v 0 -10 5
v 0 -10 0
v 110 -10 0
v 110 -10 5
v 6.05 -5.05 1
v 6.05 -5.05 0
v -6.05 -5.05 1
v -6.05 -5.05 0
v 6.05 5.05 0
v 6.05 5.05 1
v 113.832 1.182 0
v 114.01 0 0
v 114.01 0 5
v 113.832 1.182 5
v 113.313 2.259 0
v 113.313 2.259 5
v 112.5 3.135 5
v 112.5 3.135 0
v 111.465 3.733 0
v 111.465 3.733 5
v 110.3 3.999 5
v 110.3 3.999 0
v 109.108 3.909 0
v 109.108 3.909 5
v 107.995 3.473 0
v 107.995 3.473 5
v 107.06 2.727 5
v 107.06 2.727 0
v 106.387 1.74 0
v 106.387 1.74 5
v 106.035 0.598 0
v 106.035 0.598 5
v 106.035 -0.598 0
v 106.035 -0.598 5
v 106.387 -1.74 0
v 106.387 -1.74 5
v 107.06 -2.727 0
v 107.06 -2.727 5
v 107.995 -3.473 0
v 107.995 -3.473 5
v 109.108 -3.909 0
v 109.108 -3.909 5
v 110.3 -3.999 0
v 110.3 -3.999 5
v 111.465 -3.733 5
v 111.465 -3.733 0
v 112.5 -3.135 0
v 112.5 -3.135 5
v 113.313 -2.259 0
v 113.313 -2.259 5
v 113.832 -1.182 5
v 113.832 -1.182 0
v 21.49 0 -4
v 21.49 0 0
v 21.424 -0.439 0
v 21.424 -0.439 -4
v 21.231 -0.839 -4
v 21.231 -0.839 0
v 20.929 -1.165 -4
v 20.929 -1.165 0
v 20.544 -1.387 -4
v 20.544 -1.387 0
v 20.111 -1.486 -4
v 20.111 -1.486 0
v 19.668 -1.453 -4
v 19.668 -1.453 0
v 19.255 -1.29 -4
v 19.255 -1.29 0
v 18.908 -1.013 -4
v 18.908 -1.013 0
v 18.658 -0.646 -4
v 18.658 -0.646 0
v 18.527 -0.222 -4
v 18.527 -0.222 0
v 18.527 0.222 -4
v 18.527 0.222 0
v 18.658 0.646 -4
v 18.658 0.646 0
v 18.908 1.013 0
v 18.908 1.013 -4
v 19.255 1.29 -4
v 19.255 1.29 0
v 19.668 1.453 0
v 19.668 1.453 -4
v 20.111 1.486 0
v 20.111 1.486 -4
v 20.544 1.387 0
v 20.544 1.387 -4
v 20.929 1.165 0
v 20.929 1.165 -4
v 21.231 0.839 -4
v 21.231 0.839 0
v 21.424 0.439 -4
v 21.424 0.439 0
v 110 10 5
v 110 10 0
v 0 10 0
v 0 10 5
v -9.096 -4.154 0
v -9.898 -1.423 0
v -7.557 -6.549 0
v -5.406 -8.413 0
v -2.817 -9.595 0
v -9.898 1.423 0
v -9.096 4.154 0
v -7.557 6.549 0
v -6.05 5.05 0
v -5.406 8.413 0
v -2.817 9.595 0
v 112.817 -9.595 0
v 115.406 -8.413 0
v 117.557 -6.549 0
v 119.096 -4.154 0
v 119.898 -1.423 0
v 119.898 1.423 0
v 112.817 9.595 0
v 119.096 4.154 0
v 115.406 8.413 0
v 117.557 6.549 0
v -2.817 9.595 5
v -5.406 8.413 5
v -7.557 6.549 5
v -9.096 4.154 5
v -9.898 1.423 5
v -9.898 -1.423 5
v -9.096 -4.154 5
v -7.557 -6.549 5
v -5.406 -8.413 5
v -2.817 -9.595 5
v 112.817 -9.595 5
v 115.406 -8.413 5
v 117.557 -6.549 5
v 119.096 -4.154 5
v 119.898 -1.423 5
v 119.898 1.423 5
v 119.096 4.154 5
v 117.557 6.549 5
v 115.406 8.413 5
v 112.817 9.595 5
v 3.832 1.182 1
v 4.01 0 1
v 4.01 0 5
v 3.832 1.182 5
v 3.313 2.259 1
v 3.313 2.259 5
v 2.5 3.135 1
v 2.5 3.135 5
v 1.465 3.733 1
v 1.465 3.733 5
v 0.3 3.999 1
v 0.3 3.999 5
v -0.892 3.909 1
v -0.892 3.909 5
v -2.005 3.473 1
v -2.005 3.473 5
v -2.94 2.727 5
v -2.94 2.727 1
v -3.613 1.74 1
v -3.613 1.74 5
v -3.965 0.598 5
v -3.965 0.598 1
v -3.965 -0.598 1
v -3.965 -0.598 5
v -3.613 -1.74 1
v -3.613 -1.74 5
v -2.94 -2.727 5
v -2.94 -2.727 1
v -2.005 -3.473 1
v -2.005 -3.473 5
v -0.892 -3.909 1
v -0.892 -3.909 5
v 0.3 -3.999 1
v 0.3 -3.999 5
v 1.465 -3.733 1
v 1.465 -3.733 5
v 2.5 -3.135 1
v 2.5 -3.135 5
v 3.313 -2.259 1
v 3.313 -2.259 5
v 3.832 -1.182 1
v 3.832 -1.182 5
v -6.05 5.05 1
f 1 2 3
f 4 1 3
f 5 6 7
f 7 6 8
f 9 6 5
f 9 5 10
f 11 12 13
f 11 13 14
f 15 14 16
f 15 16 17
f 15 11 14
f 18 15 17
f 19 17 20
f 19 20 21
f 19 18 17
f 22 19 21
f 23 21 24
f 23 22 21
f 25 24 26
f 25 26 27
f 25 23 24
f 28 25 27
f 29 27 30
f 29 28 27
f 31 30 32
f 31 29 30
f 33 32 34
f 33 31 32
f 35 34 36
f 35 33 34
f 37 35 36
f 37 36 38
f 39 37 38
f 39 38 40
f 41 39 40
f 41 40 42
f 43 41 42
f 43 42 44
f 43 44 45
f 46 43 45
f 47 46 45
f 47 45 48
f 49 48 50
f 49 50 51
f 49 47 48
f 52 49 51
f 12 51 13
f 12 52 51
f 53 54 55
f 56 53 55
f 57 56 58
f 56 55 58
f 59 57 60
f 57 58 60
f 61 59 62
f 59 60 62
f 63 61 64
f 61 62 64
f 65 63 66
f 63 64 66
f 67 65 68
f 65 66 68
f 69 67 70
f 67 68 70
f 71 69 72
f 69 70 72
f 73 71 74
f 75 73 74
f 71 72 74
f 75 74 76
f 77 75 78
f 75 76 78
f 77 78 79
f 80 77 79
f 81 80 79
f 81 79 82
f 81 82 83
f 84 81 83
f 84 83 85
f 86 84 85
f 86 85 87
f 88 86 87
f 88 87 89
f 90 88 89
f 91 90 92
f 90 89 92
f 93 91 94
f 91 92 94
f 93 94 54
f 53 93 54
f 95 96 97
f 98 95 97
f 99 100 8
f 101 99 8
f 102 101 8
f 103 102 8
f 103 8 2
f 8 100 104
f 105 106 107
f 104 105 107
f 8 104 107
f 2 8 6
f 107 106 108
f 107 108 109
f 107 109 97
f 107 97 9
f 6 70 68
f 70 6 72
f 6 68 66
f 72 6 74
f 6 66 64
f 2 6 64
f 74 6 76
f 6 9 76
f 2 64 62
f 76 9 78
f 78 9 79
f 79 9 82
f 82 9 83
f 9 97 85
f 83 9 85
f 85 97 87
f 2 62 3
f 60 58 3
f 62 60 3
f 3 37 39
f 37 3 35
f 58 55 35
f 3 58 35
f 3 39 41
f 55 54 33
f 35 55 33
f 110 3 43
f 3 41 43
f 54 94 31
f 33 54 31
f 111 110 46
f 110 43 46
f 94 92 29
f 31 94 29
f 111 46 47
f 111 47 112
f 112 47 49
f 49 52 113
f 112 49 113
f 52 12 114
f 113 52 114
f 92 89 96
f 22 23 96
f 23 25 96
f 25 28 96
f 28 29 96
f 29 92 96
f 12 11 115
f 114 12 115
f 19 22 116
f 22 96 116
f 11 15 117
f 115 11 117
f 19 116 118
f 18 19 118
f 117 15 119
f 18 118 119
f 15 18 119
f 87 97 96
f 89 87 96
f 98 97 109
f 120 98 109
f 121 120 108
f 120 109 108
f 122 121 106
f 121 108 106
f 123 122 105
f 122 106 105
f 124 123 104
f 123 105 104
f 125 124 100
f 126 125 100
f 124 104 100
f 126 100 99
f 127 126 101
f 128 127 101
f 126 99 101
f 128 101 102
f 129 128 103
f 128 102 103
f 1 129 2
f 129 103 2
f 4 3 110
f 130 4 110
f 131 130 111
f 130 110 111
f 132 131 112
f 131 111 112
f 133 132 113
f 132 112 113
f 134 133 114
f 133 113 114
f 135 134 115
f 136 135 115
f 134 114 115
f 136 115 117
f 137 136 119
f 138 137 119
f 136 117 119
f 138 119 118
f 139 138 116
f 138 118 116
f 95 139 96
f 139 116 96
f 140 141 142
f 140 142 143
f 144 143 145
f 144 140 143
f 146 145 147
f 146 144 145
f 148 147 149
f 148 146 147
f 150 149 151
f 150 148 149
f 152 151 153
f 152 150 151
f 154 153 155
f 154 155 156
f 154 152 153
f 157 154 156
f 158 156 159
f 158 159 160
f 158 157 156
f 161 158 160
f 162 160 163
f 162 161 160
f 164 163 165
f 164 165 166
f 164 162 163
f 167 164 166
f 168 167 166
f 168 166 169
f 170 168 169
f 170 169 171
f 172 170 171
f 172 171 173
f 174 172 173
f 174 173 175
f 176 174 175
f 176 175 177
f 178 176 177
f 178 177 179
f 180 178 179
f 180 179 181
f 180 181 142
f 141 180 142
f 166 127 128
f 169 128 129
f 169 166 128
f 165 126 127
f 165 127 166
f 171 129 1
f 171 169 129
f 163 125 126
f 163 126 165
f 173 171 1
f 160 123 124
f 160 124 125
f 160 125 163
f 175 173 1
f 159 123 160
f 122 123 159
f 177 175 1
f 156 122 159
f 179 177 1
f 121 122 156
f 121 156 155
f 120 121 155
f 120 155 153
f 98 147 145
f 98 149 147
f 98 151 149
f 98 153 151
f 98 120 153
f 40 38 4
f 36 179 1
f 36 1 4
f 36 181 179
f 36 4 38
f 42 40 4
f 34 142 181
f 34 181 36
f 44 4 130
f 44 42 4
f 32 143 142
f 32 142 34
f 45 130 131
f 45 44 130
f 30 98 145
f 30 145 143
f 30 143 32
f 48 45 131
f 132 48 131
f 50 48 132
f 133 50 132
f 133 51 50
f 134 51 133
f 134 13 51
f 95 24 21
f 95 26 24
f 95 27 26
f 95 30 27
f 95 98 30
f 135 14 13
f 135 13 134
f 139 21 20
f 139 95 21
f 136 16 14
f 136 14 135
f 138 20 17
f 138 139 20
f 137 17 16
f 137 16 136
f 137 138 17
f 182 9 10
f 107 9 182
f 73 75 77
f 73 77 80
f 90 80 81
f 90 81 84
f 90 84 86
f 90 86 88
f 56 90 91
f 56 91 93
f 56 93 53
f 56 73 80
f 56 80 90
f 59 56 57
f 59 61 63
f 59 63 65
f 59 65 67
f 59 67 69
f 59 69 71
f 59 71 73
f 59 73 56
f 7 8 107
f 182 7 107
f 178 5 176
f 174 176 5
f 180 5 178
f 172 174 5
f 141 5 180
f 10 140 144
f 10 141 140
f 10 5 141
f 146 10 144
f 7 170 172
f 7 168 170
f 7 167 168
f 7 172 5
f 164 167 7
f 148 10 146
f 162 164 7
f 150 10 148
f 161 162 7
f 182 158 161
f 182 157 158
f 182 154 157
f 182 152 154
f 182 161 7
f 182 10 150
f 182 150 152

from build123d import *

# Parameters (mm, degrees)
SKETCH1_R           = 4.01
BOSS_EXTRUDE1_DEPTH = 5
SKETCH2_R           = 1.49
BOSS_EXTRUDE3_DEPTH = 4
SKETCH5_W           = 12.1
SKETCH5_H           = 10.1
CUT_EXTRUDE1_DEPTH  = 1


with BuildPart() as part:
    # Sketch1 → Boss-Extrude1 (new body)
    with BuildSketch(Plane.XY):
        with BuildLine():
            Line((110, 10), (0, 10))
            ThreePointArc((0, 10), (-10, 0), (0, -10))
            Line((0, -10), (110, -10))
            ThreePointArc((110, -10), (120, 0), (110, 10))
        make_face()
        Circle(SKETCH1_R, mode=Mode.SUBTRACT)
        with Locations((110, 0)):
            Circle(SKETCH1_R, mode=Mode.SUBTRACT)
    extrude(amount=BOSS_EXTRUDE1_DEPTH)

    # Sketch2 → Boss-Extrude3 (add)
    with BuildSketch(Plane(origin=(0, 0, 0), x_dir=(-1, 0, 0), z_dir=(0, 0, -1))):
        with Locations(Location((-20, 0, 0), (0, 0, 180))):
            Circle(SKETCH2_R)
    extrude(amount=BOSS_EXTRUDE3_DEPTH)

    # Sketch5 → Cut-Extrude1 (cut)
    with BuildSketch(Plane(origin=(0, 0, 0), x_dir=(-1, 0, 0), z_dir=(0, 0, -1))):
        Rectangle(SKETCH5_W, SKETCH5_H)
    extrude(amount=-CUT_EXTRUDE1_DEPTH, mode=Mode.SUBTRACT)


solid = part.part
